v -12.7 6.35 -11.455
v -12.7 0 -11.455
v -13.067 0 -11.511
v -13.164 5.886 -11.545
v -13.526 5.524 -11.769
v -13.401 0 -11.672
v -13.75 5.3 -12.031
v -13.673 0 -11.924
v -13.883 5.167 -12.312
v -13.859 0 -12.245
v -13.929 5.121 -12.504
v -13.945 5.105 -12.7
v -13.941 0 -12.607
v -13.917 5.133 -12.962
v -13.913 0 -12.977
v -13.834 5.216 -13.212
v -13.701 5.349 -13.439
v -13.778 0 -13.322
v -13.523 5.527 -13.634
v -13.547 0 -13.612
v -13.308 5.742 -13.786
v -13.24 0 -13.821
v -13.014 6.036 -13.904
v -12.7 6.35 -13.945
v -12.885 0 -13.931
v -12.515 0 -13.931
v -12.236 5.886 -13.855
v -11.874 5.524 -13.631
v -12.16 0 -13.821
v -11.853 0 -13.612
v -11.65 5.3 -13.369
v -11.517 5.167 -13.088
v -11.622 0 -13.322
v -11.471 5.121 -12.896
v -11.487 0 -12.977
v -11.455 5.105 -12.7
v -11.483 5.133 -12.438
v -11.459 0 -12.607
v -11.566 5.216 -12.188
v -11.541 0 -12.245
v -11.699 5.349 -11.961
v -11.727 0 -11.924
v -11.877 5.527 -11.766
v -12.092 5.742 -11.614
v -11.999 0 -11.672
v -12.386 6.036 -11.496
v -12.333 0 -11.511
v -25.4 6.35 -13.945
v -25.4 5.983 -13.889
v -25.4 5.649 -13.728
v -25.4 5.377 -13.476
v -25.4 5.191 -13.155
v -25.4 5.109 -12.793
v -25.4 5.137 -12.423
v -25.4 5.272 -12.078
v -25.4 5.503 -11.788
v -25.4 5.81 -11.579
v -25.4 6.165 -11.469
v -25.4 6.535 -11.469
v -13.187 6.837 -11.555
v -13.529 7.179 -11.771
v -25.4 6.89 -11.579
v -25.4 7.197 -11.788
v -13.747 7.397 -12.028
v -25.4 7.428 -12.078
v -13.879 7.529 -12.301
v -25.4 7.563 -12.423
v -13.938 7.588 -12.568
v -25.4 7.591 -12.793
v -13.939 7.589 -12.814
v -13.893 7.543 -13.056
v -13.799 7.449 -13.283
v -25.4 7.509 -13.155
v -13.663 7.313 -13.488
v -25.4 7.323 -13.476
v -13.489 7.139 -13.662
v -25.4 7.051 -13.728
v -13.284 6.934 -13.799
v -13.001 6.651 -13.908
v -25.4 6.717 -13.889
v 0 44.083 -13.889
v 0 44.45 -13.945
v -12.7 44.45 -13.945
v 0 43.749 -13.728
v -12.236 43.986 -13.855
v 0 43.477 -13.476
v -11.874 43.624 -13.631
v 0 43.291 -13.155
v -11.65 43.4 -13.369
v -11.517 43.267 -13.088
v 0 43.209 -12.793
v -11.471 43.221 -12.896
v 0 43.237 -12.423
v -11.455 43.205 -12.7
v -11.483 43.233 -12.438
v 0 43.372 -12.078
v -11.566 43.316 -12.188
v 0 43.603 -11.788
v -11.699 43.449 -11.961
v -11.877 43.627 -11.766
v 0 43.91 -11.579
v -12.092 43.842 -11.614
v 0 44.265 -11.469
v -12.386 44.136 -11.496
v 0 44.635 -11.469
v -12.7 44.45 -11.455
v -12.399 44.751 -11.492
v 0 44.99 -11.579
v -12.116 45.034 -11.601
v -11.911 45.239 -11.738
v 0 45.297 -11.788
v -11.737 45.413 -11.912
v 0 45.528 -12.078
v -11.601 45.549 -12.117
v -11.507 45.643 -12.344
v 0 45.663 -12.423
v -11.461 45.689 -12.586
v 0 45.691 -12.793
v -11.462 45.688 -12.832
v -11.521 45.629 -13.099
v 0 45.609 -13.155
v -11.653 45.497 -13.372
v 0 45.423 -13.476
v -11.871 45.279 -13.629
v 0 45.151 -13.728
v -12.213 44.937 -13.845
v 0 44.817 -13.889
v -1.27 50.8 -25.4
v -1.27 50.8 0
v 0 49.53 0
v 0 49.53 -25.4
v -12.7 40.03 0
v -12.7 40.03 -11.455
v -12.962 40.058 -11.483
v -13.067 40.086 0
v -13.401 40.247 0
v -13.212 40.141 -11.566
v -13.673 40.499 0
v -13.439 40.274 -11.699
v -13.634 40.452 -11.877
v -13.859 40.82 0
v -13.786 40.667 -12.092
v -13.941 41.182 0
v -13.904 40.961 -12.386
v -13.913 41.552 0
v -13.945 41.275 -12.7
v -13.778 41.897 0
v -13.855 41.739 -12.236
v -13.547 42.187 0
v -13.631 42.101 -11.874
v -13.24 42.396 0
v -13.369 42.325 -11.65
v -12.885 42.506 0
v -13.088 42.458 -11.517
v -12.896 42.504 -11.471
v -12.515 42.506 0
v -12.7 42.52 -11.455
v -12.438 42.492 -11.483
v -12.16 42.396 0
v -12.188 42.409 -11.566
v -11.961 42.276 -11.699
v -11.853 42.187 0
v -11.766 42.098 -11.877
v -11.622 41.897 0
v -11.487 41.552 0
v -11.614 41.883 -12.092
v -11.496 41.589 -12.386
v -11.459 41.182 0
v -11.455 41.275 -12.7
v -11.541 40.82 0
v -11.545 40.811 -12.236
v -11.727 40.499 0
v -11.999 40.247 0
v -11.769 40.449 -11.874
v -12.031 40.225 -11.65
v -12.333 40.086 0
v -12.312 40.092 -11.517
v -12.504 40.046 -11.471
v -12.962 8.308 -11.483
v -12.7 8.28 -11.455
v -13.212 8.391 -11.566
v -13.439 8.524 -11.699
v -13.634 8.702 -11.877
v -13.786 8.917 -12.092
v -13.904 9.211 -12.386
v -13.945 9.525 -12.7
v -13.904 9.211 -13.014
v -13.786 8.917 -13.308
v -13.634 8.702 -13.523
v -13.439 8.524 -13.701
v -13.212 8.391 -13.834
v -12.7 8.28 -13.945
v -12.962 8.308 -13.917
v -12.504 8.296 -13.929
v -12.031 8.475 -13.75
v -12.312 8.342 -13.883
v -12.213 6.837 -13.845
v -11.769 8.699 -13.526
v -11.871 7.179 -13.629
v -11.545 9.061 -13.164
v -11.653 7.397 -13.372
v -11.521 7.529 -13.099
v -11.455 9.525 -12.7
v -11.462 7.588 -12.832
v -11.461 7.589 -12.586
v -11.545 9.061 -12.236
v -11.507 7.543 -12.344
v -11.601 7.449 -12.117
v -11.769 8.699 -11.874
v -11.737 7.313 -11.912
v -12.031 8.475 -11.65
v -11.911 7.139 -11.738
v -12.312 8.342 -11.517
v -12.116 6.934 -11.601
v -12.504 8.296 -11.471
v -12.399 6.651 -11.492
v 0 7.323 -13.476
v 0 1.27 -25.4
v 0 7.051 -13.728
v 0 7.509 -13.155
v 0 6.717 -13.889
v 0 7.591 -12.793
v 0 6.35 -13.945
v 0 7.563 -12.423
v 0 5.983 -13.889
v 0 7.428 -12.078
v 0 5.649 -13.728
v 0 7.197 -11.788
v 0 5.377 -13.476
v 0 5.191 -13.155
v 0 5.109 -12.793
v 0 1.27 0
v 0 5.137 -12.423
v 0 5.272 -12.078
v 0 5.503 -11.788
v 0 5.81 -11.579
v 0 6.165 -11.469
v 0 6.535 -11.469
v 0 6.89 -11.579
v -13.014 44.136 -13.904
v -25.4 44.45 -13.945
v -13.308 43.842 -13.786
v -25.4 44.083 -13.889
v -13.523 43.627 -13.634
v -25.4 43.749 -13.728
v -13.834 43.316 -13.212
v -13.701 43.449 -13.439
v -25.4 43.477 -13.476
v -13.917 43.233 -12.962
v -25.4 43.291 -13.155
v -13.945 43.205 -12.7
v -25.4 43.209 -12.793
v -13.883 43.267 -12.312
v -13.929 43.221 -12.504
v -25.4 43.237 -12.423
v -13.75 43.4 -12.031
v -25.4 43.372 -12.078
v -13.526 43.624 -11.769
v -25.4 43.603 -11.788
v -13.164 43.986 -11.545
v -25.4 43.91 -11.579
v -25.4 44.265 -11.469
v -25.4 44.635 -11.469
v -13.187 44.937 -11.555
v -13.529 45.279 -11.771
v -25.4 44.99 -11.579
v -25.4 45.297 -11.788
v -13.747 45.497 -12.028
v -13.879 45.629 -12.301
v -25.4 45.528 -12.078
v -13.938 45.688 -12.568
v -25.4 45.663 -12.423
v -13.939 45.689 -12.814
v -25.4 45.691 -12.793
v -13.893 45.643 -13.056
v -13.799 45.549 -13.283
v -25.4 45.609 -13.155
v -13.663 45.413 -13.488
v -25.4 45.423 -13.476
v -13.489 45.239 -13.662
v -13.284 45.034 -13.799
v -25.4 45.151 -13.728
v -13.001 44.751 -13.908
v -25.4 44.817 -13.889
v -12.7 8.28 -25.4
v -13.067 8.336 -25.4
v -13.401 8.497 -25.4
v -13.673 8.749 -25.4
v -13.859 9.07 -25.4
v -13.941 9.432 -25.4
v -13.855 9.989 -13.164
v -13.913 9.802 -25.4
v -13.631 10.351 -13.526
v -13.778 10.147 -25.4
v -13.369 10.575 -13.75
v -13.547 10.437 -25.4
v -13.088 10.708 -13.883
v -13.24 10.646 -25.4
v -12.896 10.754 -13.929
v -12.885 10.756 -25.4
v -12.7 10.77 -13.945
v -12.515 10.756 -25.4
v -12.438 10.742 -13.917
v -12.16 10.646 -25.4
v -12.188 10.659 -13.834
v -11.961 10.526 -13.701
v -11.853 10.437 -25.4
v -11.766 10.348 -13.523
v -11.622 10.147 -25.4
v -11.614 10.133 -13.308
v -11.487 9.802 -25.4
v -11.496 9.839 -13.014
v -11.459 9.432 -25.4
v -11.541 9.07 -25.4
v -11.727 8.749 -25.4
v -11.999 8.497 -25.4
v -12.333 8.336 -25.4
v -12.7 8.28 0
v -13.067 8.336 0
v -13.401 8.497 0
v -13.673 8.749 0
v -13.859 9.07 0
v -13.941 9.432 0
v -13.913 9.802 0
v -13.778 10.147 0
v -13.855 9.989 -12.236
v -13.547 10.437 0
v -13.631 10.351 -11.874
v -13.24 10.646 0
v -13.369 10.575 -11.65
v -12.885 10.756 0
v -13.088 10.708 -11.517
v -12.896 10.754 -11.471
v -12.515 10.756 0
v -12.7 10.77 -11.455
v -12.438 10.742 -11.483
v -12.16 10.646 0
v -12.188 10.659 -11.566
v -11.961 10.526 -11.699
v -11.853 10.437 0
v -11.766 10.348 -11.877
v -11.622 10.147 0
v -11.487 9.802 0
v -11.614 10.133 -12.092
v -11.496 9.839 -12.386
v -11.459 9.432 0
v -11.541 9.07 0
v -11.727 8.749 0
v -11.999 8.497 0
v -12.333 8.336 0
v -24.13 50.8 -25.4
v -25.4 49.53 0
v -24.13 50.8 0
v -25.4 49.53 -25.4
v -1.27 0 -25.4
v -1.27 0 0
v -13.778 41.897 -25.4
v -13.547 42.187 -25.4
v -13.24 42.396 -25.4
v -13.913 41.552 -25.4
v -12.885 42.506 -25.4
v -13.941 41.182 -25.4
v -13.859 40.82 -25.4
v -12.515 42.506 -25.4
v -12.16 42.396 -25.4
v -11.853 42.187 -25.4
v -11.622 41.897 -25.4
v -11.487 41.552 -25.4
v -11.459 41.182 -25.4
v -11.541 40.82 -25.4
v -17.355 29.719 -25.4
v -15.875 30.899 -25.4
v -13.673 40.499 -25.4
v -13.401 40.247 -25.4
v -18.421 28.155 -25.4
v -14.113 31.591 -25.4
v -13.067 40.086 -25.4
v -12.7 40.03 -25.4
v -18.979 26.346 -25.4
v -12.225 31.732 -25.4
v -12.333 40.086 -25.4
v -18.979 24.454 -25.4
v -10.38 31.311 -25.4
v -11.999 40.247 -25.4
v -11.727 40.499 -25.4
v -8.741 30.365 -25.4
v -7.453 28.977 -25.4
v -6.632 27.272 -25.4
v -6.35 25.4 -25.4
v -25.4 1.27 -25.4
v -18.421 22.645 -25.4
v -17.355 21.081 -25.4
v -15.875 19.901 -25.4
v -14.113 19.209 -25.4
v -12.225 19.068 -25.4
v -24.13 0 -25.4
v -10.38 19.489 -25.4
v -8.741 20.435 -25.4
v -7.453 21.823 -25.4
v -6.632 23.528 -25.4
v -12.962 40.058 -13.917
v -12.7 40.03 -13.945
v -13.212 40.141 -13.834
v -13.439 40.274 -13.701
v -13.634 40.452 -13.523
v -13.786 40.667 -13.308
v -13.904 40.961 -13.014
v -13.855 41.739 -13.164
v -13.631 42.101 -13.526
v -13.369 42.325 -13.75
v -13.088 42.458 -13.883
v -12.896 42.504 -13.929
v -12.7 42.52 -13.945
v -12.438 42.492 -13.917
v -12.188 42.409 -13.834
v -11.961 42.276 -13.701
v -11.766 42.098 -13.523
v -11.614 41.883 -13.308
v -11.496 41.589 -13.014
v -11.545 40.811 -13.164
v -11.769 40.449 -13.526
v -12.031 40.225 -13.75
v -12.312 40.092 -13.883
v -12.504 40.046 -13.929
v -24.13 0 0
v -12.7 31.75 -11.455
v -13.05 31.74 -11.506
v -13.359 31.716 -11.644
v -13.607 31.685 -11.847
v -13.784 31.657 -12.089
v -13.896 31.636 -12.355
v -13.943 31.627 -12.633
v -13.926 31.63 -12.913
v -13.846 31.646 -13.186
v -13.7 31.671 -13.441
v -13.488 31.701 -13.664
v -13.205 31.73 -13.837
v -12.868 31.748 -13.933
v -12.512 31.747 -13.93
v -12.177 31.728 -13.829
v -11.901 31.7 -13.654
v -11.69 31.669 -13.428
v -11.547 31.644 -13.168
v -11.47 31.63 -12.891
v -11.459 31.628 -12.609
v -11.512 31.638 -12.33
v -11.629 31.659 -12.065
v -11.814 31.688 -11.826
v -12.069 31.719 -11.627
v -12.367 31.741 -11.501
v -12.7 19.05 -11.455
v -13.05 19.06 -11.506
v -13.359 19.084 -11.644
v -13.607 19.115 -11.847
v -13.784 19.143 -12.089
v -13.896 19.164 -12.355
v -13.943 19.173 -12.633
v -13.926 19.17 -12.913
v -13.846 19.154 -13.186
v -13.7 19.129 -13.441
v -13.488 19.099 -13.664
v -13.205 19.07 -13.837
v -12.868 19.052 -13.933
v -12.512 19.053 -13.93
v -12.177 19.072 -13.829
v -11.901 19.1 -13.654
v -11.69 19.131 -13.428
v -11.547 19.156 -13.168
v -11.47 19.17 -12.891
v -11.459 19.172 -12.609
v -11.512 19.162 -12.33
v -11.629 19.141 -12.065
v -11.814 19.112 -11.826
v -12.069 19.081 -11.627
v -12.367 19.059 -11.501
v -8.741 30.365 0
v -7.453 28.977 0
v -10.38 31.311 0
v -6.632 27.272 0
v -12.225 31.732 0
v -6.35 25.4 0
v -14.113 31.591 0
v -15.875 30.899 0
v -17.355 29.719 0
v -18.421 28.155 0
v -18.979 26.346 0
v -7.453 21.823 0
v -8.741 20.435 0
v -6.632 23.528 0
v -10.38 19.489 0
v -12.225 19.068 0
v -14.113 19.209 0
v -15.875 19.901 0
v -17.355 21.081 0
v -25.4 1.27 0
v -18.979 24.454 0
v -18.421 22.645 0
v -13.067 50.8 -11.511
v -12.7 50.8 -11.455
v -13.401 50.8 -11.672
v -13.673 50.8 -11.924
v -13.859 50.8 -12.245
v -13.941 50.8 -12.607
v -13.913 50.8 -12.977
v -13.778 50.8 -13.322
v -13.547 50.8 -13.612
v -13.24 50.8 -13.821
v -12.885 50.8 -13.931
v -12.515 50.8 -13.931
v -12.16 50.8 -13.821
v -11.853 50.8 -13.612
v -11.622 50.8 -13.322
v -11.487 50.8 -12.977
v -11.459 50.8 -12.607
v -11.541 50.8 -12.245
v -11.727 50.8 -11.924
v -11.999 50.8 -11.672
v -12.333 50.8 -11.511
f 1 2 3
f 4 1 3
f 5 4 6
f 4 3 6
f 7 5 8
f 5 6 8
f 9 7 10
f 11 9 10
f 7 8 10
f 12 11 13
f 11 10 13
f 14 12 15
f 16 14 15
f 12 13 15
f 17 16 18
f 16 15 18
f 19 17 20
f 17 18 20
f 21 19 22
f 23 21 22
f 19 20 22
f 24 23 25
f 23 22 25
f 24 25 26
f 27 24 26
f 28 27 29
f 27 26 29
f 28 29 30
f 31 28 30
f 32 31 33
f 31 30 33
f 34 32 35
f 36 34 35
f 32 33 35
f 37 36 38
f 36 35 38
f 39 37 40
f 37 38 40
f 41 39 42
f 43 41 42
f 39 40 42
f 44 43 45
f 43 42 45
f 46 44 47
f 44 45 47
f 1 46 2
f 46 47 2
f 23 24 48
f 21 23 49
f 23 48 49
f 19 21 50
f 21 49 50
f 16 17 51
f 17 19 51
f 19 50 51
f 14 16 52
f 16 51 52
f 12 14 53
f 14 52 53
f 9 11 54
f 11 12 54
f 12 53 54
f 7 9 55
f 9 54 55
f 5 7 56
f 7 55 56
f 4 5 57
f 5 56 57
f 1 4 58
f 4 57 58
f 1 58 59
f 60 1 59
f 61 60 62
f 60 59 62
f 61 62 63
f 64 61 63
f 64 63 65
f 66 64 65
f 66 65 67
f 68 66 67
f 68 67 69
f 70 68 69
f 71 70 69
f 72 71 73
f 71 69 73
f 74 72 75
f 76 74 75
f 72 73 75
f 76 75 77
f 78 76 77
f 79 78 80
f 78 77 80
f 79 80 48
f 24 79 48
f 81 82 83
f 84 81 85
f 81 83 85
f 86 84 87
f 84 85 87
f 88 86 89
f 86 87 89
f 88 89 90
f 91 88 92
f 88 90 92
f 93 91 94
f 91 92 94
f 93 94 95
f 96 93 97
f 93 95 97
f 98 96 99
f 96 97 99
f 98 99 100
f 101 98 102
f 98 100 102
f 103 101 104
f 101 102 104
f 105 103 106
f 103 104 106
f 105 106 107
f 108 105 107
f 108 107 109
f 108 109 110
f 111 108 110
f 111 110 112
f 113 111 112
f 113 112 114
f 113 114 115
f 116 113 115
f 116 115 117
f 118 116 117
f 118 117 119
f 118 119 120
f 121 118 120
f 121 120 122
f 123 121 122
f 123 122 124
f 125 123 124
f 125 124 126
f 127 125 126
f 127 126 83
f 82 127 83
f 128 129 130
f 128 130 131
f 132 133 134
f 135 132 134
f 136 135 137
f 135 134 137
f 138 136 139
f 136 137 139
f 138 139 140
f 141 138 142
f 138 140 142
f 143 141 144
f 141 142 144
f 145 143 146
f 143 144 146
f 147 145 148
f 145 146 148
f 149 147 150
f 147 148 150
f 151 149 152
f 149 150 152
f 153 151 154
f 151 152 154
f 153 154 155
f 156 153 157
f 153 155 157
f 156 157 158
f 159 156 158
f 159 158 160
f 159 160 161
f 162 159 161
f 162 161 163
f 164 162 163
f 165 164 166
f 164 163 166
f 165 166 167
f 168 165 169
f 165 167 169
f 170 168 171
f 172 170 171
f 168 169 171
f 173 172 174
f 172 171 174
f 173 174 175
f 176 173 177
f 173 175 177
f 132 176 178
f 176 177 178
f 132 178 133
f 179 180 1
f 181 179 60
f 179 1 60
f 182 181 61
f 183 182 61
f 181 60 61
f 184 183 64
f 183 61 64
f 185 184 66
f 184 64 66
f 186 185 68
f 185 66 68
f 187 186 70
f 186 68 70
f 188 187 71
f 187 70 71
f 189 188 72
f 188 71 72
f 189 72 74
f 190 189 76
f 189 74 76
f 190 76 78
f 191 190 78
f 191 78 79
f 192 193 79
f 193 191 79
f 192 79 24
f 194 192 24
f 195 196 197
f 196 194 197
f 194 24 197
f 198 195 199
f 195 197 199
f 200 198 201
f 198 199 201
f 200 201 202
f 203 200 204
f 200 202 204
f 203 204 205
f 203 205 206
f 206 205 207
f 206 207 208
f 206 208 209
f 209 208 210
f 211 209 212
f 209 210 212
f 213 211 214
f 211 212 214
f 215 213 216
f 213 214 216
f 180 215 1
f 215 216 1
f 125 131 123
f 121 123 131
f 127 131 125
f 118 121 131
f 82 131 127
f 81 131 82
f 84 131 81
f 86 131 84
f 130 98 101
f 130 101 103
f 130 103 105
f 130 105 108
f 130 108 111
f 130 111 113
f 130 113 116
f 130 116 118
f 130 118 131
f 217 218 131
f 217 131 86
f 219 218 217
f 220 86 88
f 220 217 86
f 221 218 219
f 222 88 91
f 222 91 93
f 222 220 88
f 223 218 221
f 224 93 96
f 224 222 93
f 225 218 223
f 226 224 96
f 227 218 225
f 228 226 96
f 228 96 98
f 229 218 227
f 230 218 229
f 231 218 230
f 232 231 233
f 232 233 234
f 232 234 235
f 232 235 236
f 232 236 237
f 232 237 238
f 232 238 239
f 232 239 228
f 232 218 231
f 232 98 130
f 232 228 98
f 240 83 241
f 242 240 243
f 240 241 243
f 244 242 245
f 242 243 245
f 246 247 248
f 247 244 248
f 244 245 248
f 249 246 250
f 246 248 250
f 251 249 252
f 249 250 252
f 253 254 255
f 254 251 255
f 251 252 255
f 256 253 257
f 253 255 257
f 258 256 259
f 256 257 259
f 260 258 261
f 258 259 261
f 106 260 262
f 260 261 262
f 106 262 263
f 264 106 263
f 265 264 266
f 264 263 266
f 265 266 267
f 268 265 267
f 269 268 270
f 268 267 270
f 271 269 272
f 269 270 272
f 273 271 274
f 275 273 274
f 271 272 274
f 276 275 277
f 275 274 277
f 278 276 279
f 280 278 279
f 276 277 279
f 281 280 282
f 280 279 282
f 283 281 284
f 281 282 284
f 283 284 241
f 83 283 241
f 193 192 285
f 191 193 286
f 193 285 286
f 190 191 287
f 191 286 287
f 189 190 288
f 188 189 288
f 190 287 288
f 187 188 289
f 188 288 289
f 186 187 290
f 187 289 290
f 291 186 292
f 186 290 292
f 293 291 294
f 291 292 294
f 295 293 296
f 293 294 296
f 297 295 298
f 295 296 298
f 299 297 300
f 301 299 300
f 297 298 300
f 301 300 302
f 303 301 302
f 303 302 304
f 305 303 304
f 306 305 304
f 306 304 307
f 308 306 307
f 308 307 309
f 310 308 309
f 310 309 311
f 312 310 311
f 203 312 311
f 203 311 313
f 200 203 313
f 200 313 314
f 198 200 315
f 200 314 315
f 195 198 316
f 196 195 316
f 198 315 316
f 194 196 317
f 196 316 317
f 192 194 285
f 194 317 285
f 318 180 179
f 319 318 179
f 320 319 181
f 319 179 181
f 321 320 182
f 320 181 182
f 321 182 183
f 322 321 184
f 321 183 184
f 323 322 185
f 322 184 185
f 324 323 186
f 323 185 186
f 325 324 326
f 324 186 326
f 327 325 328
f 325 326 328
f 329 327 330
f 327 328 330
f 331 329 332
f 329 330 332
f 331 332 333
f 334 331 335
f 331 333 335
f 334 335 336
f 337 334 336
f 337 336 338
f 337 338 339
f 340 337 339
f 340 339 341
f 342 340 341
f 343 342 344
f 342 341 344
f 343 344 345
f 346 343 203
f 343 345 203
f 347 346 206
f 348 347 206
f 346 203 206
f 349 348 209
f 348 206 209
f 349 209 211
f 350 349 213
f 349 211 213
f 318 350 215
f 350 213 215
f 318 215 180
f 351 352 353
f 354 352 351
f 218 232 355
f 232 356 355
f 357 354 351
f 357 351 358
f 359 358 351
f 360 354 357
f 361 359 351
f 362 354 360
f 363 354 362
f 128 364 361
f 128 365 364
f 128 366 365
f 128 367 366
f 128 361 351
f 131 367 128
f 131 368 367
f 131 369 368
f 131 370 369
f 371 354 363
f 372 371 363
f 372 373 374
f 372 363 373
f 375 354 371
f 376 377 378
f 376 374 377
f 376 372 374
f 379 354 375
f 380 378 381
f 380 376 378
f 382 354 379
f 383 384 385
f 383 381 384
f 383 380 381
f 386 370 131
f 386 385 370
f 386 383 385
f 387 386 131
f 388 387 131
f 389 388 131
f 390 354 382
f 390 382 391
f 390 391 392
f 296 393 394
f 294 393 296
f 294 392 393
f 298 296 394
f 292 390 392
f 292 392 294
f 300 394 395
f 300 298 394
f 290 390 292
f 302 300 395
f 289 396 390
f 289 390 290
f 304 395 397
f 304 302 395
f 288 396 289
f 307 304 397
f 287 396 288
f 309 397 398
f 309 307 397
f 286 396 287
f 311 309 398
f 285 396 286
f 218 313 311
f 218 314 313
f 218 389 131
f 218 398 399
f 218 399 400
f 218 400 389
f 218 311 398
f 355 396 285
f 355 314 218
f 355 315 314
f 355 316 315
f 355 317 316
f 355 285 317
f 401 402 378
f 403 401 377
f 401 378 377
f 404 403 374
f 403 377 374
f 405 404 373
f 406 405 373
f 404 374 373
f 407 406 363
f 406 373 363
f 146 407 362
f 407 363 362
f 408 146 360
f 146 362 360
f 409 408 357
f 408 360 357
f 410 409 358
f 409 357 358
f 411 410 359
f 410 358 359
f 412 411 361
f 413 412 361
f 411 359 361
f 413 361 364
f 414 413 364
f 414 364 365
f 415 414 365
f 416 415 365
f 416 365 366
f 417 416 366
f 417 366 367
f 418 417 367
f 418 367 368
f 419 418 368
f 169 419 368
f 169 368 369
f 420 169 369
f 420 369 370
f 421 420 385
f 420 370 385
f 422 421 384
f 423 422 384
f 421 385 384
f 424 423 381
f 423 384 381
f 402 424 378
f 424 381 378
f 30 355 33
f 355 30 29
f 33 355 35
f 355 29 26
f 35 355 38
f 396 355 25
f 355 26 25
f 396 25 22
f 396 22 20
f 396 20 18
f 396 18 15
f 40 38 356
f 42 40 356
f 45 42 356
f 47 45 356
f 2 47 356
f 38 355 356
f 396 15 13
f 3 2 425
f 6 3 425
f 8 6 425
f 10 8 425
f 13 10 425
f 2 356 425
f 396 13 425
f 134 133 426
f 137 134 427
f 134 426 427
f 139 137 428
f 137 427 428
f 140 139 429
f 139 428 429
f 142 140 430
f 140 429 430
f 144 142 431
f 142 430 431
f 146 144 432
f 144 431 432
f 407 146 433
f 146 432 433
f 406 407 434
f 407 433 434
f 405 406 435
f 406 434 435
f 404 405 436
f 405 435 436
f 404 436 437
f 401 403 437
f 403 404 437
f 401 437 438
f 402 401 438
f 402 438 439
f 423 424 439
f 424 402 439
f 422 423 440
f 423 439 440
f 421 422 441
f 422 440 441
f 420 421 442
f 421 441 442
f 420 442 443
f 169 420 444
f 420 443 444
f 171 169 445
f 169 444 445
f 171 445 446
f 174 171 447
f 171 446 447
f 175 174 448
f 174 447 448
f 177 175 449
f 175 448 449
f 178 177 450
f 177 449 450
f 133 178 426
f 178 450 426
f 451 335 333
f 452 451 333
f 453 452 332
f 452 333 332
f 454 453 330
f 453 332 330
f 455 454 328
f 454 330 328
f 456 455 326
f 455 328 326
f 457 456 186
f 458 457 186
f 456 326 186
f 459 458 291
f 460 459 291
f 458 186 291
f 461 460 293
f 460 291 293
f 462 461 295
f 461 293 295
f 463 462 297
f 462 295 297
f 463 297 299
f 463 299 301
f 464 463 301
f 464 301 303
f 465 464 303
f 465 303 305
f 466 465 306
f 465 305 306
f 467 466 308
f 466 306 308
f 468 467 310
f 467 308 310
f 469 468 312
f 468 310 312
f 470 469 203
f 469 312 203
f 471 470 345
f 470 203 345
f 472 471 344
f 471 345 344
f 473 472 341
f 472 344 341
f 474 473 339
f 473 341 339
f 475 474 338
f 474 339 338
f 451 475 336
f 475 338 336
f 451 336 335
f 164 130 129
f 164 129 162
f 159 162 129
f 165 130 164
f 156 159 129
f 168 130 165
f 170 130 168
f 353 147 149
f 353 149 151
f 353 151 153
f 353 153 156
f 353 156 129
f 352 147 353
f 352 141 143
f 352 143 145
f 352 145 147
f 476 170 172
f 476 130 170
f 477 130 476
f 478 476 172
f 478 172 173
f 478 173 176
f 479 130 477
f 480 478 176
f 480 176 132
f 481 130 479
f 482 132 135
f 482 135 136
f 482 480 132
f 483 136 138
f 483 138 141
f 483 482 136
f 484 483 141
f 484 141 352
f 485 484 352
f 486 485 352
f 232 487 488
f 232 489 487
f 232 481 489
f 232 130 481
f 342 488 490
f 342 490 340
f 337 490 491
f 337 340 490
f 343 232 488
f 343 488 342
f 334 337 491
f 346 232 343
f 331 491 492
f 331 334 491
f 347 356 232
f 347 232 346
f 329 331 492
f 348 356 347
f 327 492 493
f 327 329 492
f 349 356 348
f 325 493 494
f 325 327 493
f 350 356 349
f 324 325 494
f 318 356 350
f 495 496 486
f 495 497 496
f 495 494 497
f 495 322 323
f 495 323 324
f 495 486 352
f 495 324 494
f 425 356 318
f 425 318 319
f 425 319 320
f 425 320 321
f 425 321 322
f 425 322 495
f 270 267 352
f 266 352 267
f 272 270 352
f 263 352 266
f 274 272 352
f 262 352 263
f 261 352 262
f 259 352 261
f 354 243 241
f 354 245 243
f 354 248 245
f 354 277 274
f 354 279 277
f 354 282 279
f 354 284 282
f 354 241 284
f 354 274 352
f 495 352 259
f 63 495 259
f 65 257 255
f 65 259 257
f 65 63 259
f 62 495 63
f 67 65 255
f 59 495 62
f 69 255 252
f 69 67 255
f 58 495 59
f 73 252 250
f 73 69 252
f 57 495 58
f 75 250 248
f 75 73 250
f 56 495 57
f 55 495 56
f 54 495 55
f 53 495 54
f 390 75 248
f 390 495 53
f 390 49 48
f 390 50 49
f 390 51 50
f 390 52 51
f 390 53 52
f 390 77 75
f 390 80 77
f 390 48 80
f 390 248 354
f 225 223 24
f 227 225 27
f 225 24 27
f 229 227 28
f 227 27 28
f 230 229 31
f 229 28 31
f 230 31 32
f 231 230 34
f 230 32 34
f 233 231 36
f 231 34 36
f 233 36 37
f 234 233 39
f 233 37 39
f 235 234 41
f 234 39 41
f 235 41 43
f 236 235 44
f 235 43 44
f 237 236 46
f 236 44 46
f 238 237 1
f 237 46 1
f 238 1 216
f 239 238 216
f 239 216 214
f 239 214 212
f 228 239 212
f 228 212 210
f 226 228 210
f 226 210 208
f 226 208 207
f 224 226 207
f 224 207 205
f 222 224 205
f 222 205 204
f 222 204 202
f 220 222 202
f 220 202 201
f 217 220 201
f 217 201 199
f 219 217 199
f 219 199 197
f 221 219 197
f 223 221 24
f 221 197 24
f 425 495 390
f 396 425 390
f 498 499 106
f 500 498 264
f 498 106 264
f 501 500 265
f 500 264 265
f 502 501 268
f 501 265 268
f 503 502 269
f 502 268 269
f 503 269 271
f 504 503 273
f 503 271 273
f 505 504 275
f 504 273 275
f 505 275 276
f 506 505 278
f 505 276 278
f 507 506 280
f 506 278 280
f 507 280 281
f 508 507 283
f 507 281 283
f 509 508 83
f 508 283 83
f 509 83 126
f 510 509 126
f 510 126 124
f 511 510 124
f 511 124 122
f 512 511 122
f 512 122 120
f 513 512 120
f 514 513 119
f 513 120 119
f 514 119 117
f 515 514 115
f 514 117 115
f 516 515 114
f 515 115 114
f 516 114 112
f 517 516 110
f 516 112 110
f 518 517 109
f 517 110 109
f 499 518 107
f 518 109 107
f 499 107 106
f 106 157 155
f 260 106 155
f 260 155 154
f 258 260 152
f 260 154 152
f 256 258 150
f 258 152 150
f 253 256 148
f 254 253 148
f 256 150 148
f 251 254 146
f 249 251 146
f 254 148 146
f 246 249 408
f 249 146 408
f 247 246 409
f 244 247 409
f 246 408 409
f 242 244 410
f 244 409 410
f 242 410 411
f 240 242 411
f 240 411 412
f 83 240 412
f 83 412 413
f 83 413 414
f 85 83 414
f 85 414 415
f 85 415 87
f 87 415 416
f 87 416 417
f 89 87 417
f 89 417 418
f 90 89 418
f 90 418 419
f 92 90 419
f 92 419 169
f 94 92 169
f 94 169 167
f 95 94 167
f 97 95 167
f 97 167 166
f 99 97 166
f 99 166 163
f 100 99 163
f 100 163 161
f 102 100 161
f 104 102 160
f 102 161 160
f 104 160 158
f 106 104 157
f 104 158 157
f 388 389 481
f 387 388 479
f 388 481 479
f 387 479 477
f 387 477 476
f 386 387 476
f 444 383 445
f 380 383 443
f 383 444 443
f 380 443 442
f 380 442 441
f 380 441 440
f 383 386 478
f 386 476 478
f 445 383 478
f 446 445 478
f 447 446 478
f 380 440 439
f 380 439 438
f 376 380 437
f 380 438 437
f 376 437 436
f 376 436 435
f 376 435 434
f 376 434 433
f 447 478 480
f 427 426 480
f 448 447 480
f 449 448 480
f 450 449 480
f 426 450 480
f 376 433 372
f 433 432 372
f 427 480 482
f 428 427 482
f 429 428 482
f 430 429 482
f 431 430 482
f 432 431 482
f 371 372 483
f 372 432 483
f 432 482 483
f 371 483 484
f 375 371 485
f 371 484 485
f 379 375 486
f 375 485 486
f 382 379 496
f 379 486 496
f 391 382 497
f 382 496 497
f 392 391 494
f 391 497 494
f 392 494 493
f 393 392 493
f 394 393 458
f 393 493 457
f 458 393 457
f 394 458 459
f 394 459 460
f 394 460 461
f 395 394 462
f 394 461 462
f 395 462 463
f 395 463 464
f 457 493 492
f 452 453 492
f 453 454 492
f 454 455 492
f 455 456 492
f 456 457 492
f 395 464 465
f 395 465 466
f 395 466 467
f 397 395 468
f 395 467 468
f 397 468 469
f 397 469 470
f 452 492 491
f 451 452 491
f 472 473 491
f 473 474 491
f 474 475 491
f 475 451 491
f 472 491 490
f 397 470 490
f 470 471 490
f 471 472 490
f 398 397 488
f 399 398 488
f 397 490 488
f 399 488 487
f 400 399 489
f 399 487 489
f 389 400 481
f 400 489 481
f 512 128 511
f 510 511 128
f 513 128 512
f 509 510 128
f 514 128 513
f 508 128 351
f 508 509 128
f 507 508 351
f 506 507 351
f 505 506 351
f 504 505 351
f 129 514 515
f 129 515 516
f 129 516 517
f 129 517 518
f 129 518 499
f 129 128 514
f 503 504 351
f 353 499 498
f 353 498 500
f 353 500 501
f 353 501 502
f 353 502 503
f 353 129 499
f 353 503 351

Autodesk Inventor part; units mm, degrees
ref_plane "YZ Plane" through (0, 0, 0) normal (1, 0, 0) x (0, 1, 0)
ref_plane "XZ Plane" through (0, 0, 0) normal (0, 1, 0) x (-1, 0, 0)
ref_plane "XY Plane" through (0, 0, 0) normal (0, 0, 1) x (1, 0, 0)
sketch "Sketch1" plane through (0, 0, 0) normal (0, 1, 0) x (-1, 0, 0)
  line L0 (0, 0) -> (25.4, 0)
  line L1 (25.4, 0) -> (25.4, -25.4)
  line L2 (25.4, -25.4) -> (0, -25.4)
  line L3 (0, -25.4) -> (0, 0)
  dimension "d0" = 25.4
  dimension "d1" = 25.4
extrude "Extrusion1" add sketch "Sketch1" along normal blind 50.8
sketch "Sketch2" plane through (-25.4, 0, 0) normal (0, 0, 1) x (1, 0, 0)
  circle A0 centre (12.7, 25.4) radius 6.35
  line L0 (25.4, 0) -> (25.4, 50.8) projected
  line L1 (0, 50.8) -> (25.4, 50.8) projected
  line L2 (25.4, 0) -> (0, 0) projected
  point P0 (12.7, 41.275)
  point P1 (12.7, 9.525)
  dimension "d4" = 12.7
  dimension "d5" = 12.7
  dimension "d6" = 25.4
  dimension "d7" = 9.525
  dimension "d8" = 9.525
hole "Hole1" at (-12.7, 41.275, 0) at (-12.7, 9.525, 0) direction (0, 0, -1) diameter 2.4892 end through all
sketch "Sketch3" plane through (-25.4, 0, 0) normal (0, 0, 1) x (1, 0, 0)
  circle A0 centre (12.7, 25.4) radius 6.35
  line L0 (0, 50.8) -> (25.4, 50.8) projected
  line L1 (0, 0) -> (0, 50.8) projected
  point P0 (25.4, 0)
  dimension "d16" = 12.7
  dimension "d17" = 25.4
  dimension "d18" = 12.7
extrude "Extrusion2" cut sketch "Sketch3" against normal through all
sketch "Sketch4" plane through (0, 50.8, 0) normal (0, 1, 0) x (1, 0, 0)
  line L0 (0, 0) -> (0, 25.4) projected
  line L1 (0, 25.4) -> (-25.4, 25.4) projected
  point P0 (-12.7, 12.7)
  dimension "d21" = 12.7
  dimension "d22" = 12.7
hole "Hole2" at (-12.7, 50.8, -12.7) direction (0, -1, 0) diameter 2.4892 end through all
sketch "Sketch5" plane through (0, 0, 0) normal (1, 0, 0) x (0, 0, -1)
  line L0 (25.4, 0) -> (25.4, 50.8) projected
  line L1 (25.4, 0) -> (0, 0) projected
  line L2 (0, 50.8) -> (25.4, 50.8) projected
  point P0 (12.7, 44.45)
  point P1 (12.7, 6.35)
  dimension "d30" = 12.7
  dimension "d31" = 12.7
  dimension "d32" = 6.35
  dimension "d33" = 6.35
hole "Hole3" at (0, 44.45, -12.7) at (0, 6.35, -12.7) direction (-1, 0, 0) diameter 2.4892 end through all
chamfer "Chamfer1" distance 1.27 angle 45 4 edges at (0, 50.8, -12.7) (-25.4, 50.8, -12.7) (0, 0, -12.7) (-25.4, 0, -12.7)
properties part number "chain and tube block"
